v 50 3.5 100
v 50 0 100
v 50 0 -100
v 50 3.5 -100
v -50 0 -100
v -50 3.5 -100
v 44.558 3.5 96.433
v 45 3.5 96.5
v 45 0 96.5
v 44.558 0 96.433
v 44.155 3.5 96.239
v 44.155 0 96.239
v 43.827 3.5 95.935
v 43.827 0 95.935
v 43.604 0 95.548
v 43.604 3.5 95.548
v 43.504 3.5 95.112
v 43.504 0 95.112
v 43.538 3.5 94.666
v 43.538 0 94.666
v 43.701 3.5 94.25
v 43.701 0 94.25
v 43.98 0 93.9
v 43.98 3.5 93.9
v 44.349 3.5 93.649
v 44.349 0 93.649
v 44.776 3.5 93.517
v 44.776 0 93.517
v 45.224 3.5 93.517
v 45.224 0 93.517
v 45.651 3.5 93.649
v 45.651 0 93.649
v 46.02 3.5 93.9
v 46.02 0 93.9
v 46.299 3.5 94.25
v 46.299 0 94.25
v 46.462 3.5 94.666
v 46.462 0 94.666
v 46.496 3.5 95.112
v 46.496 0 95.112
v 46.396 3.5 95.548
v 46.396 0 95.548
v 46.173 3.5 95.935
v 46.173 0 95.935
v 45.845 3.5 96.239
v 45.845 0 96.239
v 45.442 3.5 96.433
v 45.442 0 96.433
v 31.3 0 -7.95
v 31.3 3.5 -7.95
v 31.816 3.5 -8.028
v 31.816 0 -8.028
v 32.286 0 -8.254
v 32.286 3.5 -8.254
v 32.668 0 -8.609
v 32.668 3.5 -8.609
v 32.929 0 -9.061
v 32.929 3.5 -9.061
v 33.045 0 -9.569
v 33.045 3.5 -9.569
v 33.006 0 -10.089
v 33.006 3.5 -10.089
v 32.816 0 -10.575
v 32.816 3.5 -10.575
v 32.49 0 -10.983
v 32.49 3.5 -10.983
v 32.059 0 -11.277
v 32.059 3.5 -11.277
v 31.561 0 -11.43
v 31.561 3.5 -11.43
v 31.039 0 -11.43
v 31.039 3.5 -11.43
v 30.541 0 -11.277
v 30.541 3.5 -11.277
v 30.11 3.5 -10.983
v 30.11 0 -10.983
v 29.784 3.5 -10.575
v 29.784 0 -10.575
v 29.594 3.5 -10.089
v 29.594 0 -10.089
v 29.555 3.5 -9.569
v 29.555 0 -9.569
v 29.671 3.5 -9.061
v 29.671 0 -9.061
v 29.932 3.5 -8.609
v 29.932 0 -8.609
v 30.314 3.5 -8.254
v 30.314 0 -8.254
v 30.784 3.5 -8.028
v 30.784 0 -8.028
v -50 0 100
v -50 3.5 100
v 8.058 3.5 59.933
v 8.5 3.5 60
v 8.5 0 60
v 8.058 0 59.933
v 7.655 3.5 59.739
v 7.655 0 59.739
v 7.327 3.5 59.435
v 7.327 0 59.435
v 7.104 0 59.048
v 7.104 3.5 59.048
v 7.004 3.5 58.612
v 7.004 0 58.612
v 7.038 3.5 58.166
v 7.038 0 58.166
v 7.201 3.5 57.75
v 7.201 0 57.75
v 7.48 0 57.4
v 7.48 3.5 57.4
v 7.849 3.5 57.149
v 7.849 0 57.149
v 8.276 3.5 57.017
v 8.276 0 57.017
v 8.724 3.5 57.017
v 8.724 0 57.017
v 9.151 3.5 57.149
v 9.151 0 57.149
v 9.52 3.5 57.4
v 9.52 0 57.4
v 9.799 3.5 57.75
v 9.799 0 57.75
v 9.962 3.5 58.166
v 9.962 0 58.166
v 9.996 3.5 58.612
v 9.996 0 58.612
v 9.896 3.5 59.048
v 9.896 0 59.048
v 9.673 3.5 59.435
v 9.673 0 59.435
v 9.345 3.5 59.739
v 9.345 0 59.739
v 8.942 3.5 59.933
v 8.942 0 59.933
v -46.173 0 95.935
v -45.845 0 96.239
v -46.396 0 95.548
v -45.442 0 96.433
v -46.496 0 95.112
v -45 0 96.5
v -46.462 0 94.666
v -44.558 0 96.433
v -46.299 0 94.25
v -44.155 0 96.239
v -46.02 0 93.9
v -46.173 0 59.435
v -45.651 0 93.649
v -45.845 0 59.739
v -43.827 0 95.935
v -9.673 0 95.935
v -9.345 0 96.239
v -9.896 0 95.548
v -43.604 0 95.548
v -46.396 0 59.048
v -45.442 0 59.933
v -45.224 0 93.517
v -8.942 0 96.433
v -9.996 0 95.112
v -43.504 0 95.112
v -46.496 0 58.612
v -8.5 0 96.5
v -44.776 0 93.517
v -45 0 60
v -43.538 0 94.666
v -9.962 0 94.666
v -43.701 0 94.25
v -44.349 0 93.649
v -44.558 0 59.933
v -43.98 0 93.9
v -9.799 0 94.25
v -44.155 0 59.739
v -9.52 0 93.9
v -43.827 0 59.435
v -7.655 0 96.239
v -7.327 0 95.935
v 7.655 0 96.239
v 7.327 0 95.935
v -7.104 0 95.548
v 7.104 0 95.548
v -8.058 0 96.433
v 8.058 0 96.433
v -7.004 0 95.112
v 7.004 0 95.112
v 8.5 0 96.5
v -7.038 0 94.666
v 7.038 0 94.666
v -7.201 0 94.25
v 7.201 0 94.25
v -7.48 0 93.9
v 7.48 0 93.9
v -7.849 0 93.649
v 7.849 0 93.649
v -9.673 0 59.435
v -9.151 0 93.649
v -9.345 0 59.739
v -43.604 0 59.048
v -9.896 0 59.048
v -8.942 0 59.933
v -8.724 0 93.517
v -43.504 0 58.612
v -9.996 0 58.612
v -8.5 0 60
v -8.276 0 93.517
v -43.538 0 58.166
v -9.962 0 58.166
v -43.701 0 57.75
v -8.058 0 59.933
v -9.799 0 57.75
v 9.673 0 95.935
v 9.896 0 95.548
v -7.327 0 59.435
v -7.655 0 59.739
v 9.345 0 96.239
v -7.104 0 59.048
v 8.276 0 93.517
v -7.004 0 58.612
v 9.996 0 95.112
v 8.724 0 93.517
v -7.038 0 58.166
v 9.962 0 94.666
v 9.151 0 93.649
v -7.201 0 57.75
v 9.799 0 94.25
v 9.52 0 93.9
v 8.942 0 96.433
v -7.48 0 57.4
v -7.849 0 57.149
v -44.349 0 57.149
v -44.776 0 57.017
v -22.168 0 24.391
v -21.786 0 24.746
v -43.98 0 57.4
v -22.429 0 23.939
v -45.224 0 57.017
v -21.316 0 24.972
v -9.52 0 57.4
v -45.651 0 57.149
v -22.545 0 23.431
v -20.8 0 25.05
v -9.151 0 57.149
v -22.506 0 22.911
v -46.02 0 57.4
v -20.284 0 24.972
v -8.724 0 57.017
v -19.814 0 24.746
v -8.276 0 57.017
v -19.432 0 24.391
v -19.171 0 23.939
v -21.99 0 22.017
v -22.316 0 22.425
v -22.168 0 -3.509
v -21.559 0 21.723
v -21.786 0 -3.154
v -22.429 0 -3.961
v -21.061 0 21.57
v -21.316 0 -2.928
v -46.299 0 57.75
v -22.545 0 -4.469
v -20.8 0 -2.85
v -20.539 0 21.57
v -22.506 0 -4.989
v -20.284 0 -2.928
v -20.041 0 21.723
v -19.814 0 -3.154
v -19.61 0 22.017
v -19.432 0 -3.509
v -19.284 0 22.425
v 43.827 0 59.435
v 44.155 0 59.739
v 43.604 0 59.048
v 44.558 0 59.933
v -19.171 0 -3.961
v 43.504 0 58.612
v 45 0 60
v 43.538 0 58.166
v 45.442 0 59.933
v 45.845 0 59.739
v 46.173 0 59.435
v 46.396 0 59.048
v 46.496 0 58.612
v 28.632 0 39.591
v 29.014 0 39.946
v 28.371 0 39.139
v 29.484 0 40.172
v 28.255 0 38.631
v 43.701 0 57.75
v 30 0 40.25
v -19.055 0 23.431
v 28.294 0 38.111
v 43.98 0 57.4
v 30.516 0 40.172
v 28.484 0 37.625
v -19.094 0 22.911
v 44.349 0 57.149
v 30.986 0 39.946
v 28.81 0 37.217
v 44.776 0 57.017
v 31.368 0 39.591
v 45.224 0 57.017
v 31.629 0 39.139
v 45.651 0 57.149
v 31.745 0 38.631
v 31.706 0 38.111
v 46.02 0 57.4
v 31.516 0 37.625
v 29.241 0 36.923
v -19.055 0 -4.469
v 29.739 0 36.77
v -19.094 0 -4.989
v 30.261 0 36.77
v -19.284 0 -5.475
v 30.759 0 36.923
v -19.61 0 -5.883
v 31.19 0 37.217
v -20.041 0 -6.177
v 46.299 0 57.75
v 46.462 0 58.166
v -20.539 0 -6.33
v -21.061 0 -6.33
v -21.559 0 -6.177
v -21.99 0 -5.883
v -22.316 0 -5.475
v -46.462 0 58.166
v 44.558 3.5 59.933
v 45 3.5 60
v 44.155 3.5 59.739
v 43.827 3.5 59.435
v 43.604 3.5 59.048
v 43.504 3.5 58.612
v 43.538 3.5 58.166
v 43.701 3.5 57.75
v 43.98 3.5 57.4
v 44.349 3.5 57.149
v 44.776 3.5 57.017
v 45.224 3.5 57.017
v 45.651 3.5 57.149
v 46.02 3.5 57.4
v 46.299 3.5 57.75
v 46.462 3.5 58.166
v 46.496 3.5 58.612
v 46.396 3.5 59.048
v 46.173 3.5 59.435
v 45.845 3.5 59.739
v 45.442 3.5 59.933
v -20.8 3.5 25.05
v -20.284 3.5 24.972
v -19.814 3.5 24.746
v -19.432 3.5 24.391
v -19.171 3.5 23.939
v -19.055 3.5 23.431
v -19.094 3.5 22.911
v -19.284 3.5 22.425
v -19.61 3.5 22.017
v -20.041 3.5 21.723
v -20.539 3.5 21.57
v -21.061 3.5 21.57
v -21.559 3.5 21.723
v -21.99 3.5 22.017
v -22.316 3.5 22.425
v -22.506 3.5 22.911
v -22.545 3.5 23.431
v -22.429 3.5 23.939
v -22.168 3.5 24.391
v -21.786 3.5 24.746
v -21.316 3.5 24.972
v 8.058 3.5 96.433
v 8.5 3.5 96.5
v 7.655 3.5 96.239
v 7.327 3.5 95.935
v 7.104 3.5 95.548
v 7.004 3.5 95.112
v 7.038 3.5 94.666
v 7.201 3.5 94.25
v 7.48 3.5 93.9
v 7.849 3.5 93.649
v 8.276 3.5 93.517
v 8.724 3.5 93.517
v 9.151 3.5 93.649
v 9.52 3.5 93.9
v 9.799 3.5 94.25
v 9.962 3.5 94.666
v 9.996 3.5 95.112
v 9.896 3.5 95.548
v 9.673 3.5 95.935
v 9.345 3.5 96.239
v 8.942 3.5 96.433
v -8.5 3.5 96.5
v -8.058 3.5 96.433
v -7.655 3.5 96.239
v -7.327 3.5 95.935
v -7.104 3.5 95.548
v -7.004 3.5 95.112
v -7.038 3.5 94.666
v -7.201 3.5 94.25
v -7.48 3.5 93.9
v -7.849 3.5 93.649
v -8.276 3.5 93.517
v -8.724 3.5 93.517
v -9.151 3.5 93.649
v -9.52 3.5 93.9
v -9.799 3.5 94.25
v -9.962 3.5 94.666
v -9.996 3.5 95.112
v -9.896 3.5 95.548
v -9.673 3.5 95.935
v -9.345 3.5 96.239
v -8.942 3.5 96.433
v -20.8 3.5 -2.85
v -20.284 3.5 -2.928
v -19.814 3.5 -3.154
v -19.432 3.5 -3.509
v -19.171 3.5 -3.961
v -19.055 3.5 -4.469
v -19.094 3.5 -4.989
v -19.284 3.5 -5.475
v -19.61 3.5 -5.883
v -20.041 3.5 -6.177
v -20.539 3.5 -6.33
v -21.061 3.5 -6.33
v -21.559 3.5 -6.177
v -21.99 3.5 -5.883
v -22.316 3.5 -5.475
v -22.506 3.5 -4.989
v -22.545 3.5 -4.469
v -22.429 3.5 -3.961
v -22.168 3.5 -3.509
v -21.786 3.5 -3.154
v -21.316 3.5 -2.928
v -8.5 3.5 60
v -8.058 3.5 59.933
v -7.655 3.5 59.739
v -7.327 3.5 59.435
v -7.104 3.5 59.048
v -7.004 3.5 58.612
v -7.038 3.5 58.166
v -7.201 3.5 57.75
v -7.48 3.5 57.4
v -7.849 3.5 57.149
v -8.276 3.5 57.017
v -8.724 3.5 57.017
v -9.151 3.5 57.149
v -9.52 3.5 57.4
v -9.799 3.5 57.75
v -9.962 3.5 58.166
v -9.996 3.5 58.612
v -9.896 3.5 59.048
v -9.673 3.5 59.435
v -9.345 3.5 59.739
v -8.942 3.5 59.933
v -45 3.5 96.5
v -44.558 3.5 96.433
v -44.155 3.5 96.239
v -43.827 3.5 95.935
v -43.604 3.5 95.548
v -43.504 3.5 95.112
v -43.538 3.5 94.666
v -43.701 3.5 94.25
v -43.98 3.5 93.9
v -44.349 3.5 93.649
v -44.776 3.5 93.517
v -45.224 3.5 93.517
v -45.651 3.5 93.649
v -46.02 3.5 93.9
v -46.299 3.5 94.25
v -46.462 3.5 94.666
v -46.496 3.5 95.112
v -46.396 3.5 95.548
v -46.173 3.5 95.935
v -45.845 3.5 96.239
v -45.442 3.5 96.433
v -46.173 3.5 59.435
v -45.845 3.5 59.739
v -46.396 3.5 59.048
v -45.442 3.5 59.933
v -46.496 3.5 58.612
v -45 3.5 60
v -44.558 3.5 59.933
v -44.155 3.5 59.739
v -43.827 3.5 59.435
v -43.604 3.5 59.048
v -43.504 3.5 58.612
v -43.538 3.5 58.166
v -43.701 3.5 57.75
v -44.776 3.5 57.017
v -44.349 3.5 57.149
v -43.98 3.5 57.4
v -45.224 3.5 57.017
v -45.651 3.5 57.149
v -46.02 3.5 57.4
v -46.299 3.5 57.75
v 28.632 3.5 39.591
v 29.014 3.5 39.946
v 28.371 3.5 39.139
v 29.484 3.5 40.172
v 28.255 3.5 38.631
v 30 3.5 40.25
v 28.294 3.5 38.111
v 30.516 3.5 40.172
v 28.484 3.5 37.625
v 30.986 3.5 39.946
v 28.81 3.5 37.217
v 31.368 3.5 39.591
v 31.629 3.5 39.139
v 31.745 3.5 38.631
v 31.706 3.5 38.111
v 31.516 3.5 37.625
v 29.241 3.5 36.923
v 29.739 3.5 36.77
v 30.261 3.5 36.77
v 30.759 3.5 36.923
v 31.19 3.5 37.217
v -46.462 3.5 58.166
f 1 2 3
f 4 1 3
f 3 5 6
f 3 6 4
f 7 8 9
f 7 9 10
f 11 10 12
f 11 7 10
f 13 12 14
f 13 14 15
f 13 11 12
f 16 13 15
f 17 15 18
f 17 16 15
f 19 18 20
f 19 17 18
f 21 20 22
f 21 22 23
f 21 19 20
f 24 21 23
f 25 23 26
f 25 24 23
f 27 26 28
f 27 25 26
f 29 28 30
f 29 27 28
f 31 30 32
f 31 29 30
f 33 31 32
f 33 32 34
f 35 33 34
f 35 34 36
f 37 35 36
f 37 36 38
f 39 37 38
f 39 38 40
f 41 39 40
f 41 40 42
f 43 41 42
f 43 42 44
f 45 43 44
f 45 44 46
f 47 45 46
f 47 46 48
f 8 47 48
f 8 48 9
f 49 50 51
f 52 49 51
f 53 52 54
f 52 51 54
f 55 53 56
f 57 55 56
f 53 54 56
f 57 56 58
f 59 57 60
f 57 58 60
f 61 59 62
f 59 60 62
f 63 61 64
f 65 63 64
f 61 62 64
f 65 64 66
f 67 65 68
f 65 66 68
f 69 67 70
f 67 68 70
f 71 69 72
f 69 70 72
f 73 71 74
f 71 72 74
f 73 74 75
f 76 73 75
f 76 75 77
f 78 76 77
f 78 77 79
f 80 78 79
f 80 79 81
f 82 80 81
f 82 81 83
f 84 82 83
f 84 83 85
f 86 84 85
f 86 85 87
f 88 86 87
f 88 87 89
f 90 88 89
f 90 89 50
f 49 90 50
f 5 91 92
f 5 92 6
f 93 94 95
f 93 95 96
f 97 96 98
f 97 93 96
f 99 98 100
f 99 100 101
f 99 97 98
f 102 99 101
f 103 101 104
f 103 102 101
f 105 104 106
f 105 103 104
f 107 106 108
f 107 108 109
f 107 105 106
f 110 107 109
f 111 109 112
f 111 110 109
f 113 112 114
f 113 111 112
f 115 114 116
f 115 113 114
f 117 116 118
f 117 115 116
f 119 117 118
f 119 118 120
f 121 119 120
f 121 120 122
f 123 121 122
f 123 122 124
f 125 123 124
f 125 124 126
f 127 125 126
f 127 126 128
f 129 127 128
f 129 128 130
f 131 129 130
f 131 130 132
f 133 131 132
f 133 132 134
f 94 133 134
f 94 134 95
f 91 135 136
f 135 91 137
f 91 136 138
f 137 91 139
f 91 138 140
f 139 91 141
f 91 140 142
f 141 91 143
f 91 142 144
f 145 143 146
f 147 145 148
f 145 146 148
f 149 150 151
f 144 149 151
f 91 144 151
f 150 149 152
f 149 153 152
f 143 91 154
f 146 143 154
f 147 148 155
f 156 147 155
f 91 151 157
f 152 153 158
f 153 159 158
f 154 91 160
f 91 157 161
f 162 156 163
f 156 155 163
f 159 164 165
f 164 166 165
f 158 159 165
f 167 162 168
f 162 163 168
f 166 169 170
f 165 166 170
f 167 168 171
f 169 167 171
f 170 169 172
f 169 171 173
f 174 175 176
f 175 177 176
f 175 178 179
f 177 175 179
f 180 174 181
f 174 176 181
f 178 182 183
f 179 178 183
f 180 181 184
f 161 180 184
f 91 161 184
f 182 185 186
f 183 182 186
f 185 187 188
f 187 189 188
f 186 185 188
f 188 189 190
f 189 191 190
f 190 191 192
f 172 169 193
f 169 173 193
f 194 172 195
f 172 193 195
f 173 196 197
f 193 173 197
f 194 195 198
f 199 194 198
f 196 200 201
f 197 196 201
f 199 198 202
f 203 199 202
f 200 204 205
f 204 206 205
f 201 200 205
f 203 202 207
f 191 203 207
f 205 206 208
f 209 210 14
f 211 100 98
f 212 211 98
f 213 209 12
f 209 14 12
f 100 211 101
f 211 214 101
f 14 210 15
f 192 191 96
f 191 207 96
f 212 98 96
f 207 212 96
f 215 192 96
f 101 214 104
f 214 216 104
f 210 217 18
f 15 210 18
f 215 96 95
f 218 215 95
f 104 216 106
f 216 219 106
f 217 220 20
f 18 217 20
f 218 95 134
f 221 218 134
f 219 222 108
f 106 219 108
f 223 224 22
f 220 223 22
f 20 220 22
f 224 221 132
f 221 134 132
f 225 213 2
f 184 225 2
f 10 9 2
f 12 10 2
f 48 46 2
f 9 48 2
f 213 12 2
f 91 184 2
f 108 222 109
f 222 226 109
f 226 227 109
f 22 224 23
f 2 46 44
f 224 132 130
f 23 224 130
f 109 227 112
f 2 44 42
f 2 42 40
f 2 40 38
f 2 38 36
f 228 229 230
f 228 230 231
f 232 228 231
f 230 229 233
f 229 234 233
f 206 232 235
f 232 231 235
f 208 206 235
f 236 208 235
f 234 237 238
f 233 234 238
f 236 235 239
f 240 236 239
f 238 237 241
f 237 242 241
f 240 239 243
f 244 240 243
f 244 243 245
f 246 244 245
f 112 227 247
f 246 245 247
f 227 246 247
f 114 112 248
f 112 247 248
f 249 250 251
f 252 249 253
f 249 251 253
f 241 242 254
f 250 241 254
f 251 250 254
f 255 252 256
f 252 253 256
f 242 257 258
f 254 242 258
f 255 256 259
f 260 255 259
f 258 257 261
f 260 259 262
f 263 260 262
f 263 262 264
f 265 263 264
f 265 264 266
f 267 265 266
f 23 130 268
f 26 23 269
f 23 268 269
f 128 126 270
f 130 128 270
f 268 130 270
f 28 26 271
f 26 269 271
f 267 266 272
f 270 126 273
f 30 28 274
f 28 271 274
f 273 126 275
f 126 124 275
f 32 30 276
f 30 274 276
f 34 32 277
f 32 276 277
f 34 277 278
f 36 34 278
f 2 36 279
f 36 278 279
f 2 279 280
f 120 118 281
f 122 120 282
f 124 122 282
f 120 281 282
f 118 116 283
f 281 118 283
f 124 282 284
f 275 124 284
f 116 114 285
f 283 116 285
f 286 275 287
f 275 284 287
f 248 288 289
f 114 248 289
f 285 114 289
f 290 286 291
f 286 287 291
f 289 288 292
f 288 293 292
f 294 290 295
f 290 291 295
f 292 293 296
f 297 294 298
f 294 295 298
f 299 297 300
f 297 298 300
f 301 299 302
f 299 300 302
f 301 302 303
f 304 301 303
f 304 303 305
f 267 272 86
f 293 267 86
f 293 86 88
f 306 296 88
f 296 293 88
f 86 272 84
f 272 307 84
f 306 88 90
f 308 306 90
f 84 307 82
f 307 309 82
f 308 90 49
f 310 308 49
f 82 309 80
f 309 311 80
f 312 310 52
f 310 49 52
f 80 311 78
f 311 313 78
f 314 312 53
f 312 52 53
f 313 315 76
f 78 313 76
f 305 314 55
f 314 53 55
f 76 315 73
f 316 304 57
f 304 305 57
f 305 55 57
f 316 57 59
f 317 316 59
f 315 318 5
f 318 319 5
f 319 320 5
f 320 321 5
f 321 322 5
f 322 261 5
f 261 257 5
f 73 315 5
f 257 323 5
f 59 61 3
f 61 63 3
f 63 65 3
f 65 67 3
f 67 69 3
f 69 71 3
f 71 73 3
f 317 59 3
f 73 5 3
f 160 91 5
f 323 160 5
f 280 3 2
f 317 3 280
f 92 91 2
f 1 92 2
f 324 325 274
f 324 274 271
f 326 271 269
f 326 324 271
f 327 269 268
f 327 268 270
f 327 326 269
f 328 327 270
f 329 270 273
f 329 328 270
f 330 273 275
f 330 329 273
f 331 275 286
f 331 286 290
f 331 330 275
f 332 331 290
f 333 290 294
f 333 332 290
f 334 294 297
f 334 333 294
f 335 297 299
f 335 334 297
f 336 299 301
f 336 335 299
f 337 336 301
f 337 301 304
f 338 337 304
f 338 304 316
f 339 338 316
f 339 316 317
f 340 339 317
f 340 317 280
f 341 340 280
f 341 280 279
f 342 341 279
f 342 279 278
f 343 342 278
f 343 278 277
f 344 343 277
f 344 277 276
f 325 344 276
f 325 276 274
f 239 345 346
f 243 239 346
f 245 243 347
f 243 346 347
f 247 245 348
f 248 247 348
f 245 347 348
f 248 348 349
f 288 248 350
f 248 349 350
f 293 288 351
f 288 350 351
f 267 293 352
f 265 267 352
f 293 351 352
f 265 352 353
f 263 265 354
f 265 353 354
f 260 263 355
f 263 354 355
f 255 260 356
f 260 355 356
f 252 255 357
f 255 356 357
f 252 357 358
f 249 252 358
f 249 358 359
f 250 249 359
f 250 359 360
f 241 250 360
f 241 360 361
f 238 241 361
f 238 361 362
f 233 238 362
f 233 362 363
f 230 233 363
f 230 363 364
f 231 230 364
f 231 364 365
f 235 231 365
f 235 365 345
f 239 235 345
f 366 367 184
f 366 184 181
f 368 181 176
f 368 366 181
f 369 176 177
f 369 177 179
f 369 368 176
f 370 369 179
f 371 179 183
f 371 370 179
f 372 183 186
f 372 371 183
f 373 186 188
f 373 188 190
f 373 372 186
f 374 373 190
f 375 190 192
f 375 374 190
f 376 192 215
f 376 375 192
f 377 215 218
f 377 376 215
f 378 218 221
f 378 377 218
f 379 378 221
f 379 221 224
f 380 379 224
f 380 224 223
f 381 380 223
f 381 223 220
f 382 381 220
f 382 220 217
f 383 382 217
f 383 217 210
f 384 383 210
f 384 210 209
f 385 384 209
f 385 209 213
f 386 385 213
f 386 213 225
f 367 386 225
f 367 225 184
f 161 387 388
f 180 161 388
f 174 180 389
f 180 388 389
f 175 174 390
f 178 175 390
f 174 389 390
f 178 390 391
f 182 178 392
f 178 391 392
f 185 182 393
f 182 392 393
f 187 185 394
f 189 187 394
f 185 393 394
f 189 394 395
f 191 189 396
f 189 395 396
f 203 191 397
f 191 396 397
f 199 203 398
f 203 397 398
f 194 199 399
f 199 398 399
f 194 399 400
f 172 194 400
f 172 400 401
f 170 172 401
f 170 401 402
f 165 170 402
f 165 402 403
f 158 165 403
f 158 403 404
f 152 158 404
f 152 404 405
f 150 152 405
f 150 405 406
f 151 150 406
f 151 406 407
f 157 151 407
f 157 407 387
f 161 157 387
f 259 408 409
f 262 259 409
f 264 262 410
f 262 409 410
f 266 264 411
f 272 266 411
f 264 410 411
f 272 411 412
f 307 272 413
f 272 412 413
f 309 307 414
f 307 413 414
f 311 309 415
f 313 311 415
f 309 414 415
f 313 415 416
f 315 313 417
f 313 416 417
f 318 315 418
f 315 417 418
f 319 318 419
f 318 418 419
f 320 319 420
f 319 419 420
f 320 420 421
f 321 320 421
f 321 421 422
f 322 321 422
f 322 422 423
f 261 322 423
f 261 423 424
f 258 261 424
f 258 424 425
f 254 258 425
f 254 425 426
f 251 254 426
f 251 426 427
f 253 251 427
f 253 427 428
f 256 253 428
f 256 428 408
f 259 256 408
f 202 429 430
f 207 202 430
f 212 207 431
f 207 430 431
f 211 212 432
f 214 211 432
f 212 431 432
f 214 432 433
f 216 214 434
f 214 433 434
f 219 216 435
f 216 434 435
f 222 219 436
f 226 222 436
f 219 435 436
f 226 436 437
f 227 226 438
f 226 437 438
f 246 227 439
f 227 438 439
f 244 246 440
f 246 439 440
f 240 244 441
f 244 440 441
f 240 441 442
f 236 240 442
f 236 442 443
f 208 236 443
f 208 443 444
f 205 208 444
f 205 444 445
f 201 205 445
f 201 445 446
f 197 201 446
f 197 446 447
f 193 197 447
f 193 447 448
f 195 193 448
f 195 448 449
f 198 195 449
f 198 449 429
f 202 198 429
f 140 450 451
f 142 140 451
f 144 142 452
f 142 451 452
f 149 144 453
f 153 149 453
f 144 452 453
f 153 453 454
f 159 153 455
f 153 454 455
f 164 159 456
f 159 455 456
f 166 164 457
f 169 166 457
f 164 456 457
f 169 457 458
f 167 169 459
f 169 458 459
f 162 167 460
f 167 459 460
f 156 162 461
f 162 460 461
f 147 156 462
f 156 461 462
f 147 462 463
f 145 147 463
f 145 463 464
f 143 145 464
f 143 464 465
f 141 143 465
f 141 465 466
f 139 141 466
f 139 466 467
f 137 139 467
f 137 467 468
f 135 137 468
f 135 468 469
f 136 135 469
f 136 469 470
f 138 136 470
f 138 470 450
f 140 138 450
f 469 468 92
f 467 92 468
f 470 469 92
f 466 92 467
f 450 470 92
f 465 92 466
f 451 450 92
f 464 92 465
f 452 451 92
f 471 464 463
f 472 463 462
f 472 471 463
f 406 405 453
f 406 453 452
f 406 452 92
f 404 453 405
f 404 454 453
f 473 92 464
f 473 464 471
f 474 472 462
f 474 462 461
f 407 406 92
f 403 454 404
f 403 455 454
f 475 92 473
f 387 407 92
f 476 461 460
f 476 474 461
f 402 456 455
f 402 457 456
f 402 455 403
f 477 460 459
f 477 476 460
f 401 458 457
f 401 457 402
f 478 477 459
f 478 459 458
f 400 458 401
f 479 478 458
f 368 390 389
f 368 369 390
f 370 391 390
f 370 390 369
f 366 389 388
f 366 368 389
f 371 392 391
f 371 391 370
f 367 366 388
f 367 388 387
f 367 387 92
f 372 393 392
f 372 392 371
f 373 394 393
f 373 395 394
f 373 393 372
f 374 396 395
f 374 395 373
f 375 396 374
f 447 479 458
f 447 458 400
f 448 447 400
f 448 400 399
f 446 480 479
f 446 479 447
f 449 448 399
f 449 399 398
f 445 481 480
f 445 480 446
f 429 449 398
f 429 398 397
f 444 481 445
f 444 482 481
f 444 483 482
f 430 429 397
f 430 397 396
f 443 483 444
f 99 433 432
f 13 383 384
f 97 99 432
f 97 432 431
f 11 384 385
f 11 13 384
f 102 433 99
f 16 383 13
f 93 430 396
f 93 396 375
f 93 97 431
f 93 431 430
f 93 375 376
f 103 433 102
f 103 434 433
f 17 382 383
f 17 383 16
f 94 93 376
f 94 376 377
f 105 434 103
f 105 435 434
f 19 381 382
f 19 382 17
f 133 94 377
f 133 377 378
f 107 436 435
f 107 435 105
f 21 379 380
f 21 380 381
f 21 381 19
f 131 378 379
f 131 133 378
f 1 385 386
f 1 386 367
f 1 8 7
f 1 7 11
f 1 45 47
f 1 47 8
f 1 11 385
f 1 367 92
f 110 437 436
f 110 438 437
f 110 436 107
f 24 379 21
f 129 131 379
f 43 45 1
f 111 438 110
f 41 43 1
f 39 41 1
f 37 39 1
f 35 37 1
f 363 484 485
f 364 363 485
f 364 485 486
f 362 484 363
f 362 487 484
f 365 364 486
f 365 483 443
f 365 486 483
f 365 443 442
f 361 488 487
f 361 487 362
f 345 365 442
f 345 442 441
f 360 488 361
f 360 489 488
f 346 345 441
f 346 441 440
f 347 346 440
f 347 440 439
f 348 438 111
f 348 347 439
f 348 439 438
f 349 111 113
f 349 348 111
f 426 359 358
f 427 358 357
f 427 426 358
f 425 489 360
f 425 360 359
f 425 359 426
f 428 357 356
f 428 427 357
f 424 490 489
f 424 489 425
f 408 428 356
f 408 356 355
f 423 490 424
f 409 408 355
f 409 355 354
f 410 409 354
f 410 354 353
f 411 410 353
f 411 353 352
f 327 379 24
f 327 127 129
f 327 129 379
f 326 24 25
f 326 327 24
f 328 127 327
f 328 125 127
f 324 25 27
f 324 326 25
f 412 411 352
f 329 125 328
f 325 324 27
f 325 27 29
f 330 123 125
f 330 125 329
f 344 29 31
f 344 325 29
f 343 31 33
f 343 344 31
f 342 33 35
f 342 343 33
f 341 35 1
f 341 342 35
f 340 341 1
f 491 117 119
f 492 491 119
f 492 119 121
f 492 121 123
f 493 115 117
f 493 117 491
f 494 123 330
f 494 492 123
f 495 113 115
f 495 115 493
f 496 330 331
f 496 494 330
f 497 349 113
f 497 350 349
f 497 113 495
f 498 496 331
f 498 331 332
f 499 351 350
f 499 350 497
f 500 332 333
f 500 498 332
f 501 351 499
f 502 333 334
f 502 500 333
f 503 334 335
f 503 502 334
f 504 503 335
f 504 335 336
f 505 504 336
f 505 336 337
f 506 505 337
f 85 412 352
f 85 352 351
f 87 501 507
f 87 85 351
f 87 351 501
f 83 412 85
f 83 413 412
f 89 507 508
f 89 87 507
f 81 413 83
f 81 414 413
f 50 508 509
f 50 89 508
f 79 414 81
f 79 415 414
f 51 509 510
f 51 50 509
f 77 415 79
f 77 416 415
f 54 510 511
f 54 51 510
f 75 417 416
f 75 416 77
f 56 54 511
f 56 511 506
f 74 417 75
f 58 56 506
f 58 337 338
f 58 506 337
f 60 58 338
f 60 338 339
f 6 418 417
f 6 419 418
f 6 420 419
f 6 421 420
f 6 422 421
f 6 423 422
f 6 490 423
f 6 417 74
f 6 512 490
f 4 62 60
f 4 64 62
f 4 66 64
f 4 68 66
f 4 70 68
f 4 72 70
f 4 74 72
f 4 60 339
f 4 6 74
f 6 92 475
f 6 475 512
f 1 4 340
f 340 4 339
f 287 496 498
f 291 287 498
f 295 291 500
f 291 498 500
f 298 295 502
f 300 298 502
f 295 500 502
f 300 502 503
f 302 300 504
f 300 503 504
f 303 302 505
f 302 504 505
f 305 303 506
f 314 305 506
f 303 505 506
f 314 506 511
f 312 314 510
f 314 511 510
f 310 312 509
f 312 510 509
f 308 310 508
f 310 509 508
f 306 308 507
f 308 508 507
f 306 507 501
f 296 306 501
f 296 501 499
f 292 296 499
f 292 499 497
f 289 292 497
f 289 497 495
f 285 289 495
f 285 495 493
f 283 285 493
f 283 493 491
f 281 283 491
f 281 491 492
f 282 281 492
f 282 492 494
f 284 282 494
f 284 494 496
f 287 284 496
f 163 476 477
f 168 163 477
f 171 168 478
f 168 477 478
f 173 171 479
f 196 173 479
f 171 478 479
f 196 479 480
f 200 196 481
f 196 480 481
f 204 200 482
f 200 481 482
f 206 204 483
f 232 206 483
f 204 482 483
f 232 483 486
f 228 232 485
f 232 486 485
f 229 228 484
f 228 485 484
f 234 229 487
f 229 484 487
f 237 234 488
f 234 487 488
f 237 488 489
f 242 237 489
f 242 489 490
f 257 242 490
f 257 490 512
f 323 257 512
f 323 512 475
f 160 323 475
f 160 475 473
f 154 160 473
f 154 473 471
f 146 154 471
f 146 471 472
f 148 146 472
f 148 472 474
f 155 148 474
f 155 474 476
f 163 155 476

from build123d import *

# Parameters (mm, degrees)
SKETCH1_W           = 100
SKETCH1_H           = 200
BOSS_EXTRUDE1_DEPTH = 3.5
CUT_EXTRUDE9_REACH  = 113.858
SKETCH4_R           = 1.75
CUT_EXTRUDE10_REACH = 113.858
SKETCH2_R           = 1.5


with BuildPart() as part:
    # Sketch1 → Boss-Extrude1 (new body)
    with BuildSketch(Plane(origin=(0, 0, 0), x_dir=(1, 0, 0), z_dir=(0, 1, 0))):
        Rectangle(SKETCH1_W, SKETCH1_H)
    extrude(amount=BOSS_EXTRUDE1_DEPTH)

    # Sketch4 → Cut-Extrude9 (cut, up to next)
    with BuildSketch(Plane(origin=(0, 3.5, 0), x_dir=(1, 0, 0), z_dir=(0, 1, 0)), mode=Mode.PRIVATE) as cut_extrude9_sk1:
        with Locations(Location((30, -38.5, 0), (0, 0, 270))):
            Circle(SKETCH4_R)
    cut_extrude9_tool1 = extrude(cut_extrude9_sk1.sketch, amount=-CUT_EXTRUDE9_REACH, mode=Mode.PRIVATE) & part.part
    # Sketch4 → Cut-Extrude9 (cut, up to next)
    with BuildSketch(Plane(origin=(0, 3.5, 0), x_dir=(1, 0, 0), z_dir=(0, 1, 0)), mode=Mode.PRIVATE) as cut_extrude9_sk2:
        with Locations(Location((-20.8, -23.3, 0), (0, 0, 270))):
            Circle(SKETCH4_R)
    cut_extrude9_tool2 = extrude(cut_extrude9_sk2.sketch, amount=-CUT_EXTRUDE9_REACH, mode=Mode.PRIVATE) & part.part
    # Sketch4 → Cut-Extrude9 (cut, up to next)
    with BuildSketch(Plane(origin=(0, 3.5, 0), x_dir=(1, 0, 0), z_dir=(0, 1, 0)), mode=Mode.PRIVATE) as cut_extrude9_sk3:
        with Locations(Location((-20.8, 4.6, 0), (0, 0, 270))):
            Circle(SKETCH4_R)
    cut_extrude9_tool3 = extrude(cut_extrude9_sk3.sketch, amount=-CUT_EXTRUDE9_REACH, mode=Mode.PRIVATE) & part.part
    # Sketch4 → Cut-Extrude9 (cut, up to next)
    with BuildSketch(Plane(origin=(0, 3.5, 0), x_dir=(1, 0, 0), z_dir=(0, 1, 0)), mode=Mode.PRIVATE) as cut_extrude9_sk4:
        with Locations(Location((31.3, 9.7, 0), (0, 0, 270))):
            Circle(SKETCH4_R)
    cut_extrude9_tool4 = extrude(cut_extrude9_sk4.sketch, amount=-CUT_EXTRUDE9_REACH, mode=Mode.PRIVATE) & part.part
    add(cut_extrude9_tool1.solids().sort_by_distance((30, 3.5, 38.5))[0], mode=Mode.SUBTRACT)
    add(cut_extrude9_tool2.solids().sort_by_distance((-20.8, 3.5, 23.3))[0], mode=Mode.SUBTRACT)
    add(cut_extrude9_tool3.solids().sort_by_distance((-20.8, 3.5, -4.6))[0], mode=Mode.SUBTRACT)
    add(cut_extrude9_tool4.solids().sort_by_distance((31.3, 3.5, -9.7))[0], mode=Mode.SUBTRACT)

    # Sketch2 → Cut-Extrude10 (cut, up to next)
    with BuildSketch(Plane(origin=(0, 3.5, 0), x_dir=(1, 0, 0), z_dir=(0, 1, 0)), mode=Mode.PRIVATE) as cut_extrude10_sk1:
        with Locations(Location((-45, -58.5, 0), (0, 0, 270))):
            Circle(SKETCH2_R)
    cut_extrude10_tool1 = extrude(cut_extrude10_sk1.sketch, amount=-CUT_EXTRUDE10_REACH, mode=Mode.PRIVATE) & part.part
    # Sketch2 → Cut-Extrude10 (cut, up to next)
    with BuildSketch(Plane(origin=(0, 3.5, 0), x_dir=(1, 0, 0), z_dir=(0, 1, 0)), mode=Mode.PRIVATE) as cut_extrude10_sk2:
        with Locations(Location((-45, -95, 0), (0, 0, 270))):
            Circle(SKETCH2_R)
    cut_extrude10_tool2 = extrude(cut_extrude10_sk2.sketch, amount=-CUT_EXTRUDE10_REACH, mode=Mode.PRIVATE) & part.part
    # Sketch2 → Cut-Extrude10 (cut, up to next)
    with BuildSketch(Plane(origin=(0, 3.5, 0), x_dir=(1, 0, 0), z_dir=(0, 1, 0)), mode=Mode.PRIVATE) as cut_extrude10_sk3:
        with Locations(Location((-8.5, -58.5, 0), (0, 0, 270))):
            Circle(SKETCH2_R)
    cut_extrude10_tool3 = extrude(cut_extrude10_sk3.sketch, amount=-CUT_EXTRUDE10_REACH, mode=Mode.PRIVATE) & part.part
    # Sketch2 → Cut-Extrude10 (cut, up to next)
    with BuildSketch(Plane(origin=(0, 3.5, 0), x_dir=(1, 0, 0), z_dir=(0, 1, 0)), mode=Mode.PRIVATE) as cut_extrude10_sk4:
        with Locations(Location((-8.5, -95, 0), (0, 0, 270))):
            Circle(SKETCH2_R)
    cut_extrude10_tool4 = extrude(cut_extrude10_sk4.sketch, amount=-CUT_EXTRUDE10_REACH, mode=Mode.PRIVATE) & part.part
    cut_extrude10_1 = cut_extrude10_tool1.solids().sort_by_distance((-45, 3.5, 58.5))[0]
    add(cut_extrude10_1, mode=Mode.SUBTRACT)
    cut_extrude10_2 = cut_extrude10_tool2.solids().sort_by_distance((-45, 3.5, 95))[0]
    add(cut_extrude10_2, mode=Mode.SUBTRACT)
    cut_extrude10_3 = cut_extrude10_tool3.solids().sort_by_distance((-8.5, 3.5, 58.5))[0]
    add(cut_extrude10_3, mode=Mode.SUBTRACT)
    cut_extrude10_4 = cut_extrude10_tool4.solids().sort_by_distance((-8.5, 3.5, 95))[0]
    add(cut_extrude10_4, mode=Mode.SUBTRACT)
    cut_extrude10 = cut_extrude10_1 + cut_extrude10_2 + cut_extrude10_3 + cut_extrude10_4  # Cut-Extrude10 as one shape, for the pattern or mirror that repeats it

    # Mirror2: Cut-Extrude10 across plane
    add(cut_extrude10.mirror(Plane(origin=(0, 0, 0), x_dir=(0, 0, 1), z_dir=(1, 0, 0))), mode=Mode.SUBTRACT)


solid = part.part
